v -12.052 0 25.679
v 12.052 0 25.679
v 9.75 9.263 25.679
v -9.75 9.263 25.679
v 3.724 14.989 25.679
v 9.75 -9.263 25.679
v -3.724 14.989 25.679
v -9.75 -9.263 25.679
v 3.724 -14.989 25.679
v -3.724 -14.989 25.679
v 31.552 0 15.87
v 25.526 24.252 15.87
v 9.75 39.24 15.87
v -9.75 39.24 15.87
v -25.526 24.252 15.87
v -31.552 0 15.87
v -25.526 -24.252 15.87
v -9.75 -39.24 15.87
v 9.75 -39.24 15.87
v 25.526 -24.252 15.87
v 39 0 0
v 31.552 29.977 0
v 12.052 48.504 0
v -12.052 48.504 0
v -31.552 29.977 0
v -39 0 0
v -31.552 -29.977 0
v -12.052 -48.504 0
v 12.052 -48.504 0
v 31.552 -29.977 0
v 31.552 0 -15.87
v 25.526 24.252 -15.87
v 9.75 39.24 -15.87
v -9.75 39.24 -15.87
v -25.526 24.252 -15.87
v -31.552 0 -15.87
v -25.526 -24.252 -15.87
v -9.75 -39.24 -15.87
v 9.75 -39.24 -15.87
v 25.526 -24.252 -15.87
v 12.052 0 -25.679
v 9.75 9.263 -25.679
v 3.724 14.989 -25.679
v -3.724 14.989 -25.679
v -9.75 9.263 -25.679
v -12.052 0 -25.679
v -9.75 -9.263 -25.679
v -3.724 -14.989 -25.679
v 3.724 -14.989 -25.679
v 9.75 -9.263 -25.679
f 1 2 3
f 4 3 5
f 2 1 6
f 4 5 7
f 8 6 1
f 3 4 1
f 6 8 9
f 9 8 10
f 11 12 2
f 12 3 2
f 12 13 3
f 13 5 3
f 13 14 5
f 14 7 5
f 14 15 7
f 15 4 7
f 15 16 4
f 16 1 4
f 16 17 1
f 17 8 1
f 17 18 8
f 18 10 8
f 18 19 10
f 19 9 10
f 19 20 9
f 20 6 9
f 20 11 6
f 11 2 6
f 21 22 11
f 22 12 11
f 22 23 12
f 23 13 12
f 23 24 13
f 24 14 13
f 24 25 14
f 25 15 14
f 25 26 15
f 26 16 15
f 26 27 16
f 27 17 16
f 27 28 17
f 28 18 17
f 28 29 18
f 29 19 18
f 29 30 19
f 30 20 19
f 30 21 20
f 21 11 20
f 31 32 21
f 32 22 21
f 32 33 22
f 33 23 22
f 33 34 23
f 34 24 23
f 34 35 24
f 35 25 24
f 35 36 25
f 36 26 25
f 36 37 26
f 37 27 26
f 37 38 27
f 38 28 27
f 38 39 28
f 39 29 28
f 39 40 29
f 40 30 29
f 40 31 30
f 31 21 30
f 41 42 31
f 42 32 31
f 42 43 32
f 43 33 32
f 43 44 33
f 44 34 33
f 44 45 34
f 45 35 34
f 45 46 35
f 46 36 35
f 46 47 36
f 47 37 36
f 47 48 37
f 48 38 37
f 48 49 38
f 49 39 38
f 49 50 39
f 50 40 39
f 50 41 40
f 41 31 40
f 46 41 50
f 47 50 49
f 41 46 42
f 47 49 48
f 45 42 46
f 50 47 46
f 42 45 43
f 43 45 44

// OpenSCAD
// Generated by SolidPython 1.0.1 on 2020-07-29 00:46:51


scale(v = [13, 17, 9]) {
	sphere(r = 3);
}
/***********************************************
*********      SolidPython code:      **********
************************************************
 
# import packages: SolidPython
from solid import *
from solid.utils import *
from itertools import chain, combinations, permutations


class Resize:

    def __init__(self, scad_file):
        self.scad_file = scad_file
        #self.scad_file = import_scad(scad_file)
        # cone/cylinder param:
        self.r1 = 0
        self.r2 = 0
        self.h = 0
        # rectangular prism param:
        self.w = 0
        self.l = 0
        # ellipse param:
        self.r = 0

    # import OpenScad code (file name corresponds to shape)


    # classify shape + parameters
    def assign(self, param1, param2, param3):
        if self.scad_file == 'cone.scad':
            self.r1 = param1
            self.r2 = param2
            self.h = param3
        elif self.scad_file == 'cylinder.scad':
            self.r1 = param1
            self.r2 = param2
            self.h = param3
        elif self.scad_file == 'rectangularPrism.scad':
            self.h = param1
            self.l = param2
            self.w = param3
        else:
            self.r = param1
            self.h = param2

    # resize parameters
    def iterate(self):
        x = range(3, 20, 2)
        i = 1
        if self.scad_file == 'cone.scad':
            tempList = list(permutations(x, 2))
            for temp in tempList:
                param1 = temp[0]
                param2 = temp[1]
                filepath = 'produced_scad_files/' + 'cone' + str(param1) + '_' + str(param2) + '_' + '.scad'
                scad_render_to_file(cylinder(h=param1, r1=param2, r2=0), filepath)

        elif self.scad_file == 'cylinder.scad':
            tempList = list(permutations(x, 3))
            for temp in tempList:
                param1 = temp[0]
                param2 = temp[1]
                filepath = 'produced_scad_files/' + 'cylinder' + str(param1) + '_' + str(param2) + '_' + '.scad'
                scad_render_to_file(cylinder(h=param1, r1=param2, r2=param2), filepath)

        elif self.scad_file == 'rectangularPrism.scad':
            tempList = list(permutations(x, 3))
            for temp in tempList:
                param1 = temp[0]
                param2 = temp[1]
                param3 = temp[2]
                filepath = 'produced_scad_files/' + 'rectangularPrism' + str(param1) + '_' + str(param2) + '_' + str(
                    param3) + '.scad'
                scad_render_to_file(cube(size=(param1, param2, param3)), filepath)

        elif self.scad_file == 'ellipse.scad':
            tempList = list(permutations(x, 4))
            for temp in tempList:
                param1 = temp[0]
                param2 = temp[1]
                param3 = temp[2]
                param4 = temp[3]
                filepath = 'produced_scad_files/' + 'ellipse' + str(param1) + '_' + str(param2) + '_' + str(param3) + '_' + str(param4) + '.scad'
                scad_render_to_file(scale([param1, param2, param3])(sphere(r=param4)), filepath)

    def render_to_scadfile(self):
        scad_render_to_file(scad, 'example.scad') 
 
************************************************/
